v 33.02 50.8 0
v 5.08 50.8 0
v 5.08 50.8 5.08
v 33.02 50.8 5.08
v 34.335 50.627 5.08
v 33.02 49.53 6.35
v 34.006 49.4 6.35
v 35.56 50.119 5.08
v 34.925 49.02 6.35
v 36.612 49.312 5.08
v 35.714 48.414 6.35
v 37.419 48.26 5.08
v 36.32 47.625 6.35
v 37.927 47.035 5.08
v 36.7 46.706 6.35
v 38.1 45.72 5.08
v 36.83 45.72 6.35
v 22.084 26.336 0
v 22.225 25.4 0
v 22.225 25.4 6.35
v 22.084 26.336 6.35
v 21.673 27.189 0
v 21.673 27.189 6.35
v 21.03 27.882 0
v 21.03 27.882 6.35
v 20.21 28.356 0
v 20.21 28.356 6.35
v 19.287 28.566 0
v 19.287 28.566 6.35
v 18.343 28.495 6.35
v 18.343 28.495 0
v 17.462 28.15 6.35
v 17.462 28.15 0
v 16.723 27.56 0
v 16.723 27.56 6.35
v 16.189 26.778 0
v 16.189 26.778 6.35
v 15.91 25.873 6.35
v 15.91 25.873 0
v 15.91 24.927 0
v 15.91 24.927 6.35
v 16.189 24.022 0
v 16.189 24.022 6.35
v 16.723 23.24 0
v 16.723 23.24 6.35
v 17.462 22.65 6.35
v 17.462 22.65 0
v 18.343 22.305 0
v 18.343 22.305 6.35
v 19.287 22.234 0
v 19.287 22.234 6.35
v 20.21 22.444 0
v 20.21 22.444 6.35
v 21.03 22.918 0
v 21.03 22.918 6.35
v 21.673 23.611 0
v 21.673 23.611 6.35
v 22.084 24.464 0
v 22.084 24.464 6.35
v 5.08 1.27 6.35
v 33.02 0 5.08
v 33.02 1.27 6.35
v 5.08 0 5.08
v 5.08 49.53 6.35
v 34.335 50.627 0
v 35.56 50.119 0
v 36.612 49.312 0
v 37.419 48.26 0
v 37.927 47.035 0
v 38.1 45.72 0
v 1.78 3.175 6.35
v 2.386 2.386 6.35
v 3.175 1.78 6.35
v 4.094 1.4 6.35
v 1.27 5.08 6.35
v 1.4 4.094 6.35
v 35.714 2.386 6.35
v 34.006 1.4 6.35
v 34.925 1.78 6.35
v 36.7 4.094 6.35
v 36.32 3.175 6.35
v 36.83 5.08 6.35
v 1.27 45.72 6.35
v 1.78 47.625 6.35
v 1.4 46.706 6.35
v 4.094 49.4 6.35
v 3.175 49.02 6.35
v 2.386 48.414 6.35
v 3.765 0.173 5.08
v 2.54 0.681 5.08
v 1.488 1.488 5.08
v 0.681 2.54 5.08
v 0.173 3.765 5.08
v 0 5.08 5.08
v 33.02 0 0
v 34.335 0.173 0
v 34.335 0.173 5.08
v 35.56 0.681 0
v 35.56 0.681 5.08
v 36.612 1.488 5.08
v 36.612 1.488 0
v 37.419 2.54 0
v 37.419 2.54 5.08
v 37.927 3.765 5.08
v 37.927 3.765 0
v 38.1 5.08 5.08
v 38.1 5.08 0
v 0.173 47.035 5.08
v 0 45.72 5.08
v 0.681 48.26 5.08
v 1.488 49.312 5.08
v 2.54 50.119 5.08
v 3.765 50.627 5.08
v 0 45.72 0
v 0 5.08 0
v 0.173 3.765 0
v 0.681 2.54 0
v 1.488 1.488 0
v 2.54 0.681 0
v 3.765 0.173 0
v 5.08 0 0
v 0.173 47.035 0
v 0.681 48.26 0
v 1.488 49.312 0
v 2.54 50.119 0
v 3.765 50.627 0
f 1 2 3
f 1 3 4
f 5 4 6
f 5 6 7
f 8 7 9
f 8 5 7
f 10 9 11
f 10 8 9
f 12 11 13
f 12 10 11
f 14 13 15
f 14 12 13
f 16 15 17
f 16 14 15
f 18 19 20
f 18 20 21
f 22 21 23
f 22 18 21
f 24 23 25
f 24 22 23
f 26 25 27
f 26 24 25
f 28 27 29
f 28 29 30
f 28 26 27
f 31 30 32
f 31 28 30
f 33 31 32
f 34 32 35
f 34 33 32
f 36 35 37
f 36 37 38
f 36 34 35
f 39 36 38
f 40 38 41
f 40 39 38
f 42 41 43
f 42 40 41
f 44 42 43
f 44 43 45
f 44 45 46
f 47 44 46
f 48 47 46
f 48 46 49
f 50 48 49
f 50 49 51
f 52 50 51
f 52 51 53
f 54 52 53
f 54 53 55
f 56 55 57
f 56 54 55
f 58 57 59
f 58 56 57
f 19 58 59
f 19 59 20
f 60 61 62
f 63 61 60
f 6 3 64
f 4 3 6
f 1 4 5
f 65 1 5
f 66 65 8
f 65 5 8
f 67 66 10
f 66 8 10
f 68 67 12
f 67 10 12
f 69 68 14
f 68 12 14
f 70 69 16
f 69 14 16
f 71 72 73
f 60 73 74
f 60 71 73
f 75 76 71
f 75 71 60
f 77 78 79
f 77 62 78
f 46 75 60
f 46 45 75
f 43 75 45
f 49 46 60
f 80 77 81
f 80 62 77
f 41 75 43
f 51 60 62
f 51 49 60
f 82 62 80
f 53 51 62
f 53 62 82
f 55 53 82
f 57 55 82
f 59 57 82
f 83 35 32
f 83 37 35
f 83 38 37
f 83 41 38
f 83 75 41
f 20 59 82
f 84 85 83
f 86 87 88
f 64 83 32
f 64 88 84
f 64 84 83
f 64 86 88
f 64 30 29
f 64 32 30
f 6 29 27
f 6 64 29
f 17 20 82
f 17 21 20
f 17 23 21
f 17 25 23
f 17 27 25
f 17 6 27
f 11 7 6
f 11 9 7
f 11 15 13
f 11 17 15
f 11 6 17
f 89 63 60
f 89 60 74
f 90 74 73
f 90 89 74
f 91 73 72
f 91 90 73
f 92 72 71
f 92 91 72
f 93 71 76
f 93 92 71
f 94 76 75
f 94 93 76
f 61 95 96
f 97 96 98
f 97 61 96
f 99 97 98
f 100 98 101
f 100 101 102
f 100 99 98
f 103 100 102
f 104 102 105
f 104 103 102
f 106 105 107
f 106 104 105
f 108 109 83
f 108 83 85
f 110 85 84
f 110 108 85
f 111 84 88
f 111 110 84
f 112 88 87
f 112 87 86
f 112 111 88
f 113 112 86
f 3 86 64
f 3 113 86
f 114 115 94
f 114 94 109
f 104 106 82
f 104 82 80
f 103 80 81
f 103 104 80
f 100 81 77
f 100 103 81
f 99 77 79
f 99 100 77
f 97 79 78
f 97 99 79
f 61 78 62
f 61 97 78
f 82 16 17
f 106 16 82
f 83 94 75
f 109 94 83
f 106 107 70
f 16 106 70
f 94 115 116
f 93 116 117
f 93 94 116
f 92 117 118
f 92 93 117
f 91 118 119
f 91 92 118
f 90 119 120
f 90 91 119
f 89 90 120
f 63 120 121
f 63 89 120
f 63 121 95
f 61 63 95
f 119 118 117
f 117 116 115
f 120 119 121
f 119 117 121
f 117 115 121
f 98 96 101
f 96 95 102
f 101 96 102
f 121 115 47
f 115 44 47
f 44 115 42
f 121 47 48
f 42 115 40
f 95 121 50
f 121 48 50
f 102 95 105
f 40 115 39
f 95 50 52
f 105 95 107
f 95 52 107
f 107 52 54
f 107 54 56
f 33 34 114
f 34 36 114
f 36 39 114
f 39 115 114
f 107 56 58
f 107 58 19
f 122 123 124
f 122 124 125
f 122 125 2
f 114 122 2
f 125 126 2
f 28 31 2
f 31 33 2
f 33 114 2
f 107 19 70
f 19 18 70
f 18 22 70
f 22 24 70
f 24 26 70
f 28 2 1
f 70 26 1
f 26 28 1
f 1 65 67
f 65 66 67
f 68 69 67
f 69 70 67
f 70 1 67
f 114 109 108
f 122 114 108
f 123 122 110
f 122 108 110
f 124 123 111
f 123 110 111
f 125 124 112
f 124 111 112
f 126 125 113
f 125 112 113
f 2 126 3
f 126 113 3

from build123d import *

# Parameters (mm, degrees)
F0_W     = 38.1
F0_H     = 50.8
F0_R     = 3.175
F1_DEPTH = 6.35
F2_R     = 5.08
F3_SIZE  = 1.27


with BuildPart() as f1:
    # F0 (on Top) → F1 (new body)
    with BuildSketch(Plane.XY):
        with Locations((19.05, 25.4)):
            Rectangle(F0_W, F0_H)
        with Locations((19.05, 25.4)):
            Circle(F0_R, mode=Mode.SUBTRACT)
    extrude(amount=F1_DEPTH)

    # F2
    f2_edges = [f1.edges().sort_by_distance(p)[0] for p in [
        (0, 50.8, 3.175),
        (0, 0, 3.175),
        (38.1, 0, 3.175),
        (38.1, 50.8, 3.175),
    ]]
    fillet(f2_edges, radius=F2_R)

    # F3
    f3_edges = [f1.edges().sort_by_distance(p)[0] for p in [
        (19.05, 50.8, 6.35),
    ]]
    chamfer(f3_edges, length=F3_SIZE)


solid = f1.part
